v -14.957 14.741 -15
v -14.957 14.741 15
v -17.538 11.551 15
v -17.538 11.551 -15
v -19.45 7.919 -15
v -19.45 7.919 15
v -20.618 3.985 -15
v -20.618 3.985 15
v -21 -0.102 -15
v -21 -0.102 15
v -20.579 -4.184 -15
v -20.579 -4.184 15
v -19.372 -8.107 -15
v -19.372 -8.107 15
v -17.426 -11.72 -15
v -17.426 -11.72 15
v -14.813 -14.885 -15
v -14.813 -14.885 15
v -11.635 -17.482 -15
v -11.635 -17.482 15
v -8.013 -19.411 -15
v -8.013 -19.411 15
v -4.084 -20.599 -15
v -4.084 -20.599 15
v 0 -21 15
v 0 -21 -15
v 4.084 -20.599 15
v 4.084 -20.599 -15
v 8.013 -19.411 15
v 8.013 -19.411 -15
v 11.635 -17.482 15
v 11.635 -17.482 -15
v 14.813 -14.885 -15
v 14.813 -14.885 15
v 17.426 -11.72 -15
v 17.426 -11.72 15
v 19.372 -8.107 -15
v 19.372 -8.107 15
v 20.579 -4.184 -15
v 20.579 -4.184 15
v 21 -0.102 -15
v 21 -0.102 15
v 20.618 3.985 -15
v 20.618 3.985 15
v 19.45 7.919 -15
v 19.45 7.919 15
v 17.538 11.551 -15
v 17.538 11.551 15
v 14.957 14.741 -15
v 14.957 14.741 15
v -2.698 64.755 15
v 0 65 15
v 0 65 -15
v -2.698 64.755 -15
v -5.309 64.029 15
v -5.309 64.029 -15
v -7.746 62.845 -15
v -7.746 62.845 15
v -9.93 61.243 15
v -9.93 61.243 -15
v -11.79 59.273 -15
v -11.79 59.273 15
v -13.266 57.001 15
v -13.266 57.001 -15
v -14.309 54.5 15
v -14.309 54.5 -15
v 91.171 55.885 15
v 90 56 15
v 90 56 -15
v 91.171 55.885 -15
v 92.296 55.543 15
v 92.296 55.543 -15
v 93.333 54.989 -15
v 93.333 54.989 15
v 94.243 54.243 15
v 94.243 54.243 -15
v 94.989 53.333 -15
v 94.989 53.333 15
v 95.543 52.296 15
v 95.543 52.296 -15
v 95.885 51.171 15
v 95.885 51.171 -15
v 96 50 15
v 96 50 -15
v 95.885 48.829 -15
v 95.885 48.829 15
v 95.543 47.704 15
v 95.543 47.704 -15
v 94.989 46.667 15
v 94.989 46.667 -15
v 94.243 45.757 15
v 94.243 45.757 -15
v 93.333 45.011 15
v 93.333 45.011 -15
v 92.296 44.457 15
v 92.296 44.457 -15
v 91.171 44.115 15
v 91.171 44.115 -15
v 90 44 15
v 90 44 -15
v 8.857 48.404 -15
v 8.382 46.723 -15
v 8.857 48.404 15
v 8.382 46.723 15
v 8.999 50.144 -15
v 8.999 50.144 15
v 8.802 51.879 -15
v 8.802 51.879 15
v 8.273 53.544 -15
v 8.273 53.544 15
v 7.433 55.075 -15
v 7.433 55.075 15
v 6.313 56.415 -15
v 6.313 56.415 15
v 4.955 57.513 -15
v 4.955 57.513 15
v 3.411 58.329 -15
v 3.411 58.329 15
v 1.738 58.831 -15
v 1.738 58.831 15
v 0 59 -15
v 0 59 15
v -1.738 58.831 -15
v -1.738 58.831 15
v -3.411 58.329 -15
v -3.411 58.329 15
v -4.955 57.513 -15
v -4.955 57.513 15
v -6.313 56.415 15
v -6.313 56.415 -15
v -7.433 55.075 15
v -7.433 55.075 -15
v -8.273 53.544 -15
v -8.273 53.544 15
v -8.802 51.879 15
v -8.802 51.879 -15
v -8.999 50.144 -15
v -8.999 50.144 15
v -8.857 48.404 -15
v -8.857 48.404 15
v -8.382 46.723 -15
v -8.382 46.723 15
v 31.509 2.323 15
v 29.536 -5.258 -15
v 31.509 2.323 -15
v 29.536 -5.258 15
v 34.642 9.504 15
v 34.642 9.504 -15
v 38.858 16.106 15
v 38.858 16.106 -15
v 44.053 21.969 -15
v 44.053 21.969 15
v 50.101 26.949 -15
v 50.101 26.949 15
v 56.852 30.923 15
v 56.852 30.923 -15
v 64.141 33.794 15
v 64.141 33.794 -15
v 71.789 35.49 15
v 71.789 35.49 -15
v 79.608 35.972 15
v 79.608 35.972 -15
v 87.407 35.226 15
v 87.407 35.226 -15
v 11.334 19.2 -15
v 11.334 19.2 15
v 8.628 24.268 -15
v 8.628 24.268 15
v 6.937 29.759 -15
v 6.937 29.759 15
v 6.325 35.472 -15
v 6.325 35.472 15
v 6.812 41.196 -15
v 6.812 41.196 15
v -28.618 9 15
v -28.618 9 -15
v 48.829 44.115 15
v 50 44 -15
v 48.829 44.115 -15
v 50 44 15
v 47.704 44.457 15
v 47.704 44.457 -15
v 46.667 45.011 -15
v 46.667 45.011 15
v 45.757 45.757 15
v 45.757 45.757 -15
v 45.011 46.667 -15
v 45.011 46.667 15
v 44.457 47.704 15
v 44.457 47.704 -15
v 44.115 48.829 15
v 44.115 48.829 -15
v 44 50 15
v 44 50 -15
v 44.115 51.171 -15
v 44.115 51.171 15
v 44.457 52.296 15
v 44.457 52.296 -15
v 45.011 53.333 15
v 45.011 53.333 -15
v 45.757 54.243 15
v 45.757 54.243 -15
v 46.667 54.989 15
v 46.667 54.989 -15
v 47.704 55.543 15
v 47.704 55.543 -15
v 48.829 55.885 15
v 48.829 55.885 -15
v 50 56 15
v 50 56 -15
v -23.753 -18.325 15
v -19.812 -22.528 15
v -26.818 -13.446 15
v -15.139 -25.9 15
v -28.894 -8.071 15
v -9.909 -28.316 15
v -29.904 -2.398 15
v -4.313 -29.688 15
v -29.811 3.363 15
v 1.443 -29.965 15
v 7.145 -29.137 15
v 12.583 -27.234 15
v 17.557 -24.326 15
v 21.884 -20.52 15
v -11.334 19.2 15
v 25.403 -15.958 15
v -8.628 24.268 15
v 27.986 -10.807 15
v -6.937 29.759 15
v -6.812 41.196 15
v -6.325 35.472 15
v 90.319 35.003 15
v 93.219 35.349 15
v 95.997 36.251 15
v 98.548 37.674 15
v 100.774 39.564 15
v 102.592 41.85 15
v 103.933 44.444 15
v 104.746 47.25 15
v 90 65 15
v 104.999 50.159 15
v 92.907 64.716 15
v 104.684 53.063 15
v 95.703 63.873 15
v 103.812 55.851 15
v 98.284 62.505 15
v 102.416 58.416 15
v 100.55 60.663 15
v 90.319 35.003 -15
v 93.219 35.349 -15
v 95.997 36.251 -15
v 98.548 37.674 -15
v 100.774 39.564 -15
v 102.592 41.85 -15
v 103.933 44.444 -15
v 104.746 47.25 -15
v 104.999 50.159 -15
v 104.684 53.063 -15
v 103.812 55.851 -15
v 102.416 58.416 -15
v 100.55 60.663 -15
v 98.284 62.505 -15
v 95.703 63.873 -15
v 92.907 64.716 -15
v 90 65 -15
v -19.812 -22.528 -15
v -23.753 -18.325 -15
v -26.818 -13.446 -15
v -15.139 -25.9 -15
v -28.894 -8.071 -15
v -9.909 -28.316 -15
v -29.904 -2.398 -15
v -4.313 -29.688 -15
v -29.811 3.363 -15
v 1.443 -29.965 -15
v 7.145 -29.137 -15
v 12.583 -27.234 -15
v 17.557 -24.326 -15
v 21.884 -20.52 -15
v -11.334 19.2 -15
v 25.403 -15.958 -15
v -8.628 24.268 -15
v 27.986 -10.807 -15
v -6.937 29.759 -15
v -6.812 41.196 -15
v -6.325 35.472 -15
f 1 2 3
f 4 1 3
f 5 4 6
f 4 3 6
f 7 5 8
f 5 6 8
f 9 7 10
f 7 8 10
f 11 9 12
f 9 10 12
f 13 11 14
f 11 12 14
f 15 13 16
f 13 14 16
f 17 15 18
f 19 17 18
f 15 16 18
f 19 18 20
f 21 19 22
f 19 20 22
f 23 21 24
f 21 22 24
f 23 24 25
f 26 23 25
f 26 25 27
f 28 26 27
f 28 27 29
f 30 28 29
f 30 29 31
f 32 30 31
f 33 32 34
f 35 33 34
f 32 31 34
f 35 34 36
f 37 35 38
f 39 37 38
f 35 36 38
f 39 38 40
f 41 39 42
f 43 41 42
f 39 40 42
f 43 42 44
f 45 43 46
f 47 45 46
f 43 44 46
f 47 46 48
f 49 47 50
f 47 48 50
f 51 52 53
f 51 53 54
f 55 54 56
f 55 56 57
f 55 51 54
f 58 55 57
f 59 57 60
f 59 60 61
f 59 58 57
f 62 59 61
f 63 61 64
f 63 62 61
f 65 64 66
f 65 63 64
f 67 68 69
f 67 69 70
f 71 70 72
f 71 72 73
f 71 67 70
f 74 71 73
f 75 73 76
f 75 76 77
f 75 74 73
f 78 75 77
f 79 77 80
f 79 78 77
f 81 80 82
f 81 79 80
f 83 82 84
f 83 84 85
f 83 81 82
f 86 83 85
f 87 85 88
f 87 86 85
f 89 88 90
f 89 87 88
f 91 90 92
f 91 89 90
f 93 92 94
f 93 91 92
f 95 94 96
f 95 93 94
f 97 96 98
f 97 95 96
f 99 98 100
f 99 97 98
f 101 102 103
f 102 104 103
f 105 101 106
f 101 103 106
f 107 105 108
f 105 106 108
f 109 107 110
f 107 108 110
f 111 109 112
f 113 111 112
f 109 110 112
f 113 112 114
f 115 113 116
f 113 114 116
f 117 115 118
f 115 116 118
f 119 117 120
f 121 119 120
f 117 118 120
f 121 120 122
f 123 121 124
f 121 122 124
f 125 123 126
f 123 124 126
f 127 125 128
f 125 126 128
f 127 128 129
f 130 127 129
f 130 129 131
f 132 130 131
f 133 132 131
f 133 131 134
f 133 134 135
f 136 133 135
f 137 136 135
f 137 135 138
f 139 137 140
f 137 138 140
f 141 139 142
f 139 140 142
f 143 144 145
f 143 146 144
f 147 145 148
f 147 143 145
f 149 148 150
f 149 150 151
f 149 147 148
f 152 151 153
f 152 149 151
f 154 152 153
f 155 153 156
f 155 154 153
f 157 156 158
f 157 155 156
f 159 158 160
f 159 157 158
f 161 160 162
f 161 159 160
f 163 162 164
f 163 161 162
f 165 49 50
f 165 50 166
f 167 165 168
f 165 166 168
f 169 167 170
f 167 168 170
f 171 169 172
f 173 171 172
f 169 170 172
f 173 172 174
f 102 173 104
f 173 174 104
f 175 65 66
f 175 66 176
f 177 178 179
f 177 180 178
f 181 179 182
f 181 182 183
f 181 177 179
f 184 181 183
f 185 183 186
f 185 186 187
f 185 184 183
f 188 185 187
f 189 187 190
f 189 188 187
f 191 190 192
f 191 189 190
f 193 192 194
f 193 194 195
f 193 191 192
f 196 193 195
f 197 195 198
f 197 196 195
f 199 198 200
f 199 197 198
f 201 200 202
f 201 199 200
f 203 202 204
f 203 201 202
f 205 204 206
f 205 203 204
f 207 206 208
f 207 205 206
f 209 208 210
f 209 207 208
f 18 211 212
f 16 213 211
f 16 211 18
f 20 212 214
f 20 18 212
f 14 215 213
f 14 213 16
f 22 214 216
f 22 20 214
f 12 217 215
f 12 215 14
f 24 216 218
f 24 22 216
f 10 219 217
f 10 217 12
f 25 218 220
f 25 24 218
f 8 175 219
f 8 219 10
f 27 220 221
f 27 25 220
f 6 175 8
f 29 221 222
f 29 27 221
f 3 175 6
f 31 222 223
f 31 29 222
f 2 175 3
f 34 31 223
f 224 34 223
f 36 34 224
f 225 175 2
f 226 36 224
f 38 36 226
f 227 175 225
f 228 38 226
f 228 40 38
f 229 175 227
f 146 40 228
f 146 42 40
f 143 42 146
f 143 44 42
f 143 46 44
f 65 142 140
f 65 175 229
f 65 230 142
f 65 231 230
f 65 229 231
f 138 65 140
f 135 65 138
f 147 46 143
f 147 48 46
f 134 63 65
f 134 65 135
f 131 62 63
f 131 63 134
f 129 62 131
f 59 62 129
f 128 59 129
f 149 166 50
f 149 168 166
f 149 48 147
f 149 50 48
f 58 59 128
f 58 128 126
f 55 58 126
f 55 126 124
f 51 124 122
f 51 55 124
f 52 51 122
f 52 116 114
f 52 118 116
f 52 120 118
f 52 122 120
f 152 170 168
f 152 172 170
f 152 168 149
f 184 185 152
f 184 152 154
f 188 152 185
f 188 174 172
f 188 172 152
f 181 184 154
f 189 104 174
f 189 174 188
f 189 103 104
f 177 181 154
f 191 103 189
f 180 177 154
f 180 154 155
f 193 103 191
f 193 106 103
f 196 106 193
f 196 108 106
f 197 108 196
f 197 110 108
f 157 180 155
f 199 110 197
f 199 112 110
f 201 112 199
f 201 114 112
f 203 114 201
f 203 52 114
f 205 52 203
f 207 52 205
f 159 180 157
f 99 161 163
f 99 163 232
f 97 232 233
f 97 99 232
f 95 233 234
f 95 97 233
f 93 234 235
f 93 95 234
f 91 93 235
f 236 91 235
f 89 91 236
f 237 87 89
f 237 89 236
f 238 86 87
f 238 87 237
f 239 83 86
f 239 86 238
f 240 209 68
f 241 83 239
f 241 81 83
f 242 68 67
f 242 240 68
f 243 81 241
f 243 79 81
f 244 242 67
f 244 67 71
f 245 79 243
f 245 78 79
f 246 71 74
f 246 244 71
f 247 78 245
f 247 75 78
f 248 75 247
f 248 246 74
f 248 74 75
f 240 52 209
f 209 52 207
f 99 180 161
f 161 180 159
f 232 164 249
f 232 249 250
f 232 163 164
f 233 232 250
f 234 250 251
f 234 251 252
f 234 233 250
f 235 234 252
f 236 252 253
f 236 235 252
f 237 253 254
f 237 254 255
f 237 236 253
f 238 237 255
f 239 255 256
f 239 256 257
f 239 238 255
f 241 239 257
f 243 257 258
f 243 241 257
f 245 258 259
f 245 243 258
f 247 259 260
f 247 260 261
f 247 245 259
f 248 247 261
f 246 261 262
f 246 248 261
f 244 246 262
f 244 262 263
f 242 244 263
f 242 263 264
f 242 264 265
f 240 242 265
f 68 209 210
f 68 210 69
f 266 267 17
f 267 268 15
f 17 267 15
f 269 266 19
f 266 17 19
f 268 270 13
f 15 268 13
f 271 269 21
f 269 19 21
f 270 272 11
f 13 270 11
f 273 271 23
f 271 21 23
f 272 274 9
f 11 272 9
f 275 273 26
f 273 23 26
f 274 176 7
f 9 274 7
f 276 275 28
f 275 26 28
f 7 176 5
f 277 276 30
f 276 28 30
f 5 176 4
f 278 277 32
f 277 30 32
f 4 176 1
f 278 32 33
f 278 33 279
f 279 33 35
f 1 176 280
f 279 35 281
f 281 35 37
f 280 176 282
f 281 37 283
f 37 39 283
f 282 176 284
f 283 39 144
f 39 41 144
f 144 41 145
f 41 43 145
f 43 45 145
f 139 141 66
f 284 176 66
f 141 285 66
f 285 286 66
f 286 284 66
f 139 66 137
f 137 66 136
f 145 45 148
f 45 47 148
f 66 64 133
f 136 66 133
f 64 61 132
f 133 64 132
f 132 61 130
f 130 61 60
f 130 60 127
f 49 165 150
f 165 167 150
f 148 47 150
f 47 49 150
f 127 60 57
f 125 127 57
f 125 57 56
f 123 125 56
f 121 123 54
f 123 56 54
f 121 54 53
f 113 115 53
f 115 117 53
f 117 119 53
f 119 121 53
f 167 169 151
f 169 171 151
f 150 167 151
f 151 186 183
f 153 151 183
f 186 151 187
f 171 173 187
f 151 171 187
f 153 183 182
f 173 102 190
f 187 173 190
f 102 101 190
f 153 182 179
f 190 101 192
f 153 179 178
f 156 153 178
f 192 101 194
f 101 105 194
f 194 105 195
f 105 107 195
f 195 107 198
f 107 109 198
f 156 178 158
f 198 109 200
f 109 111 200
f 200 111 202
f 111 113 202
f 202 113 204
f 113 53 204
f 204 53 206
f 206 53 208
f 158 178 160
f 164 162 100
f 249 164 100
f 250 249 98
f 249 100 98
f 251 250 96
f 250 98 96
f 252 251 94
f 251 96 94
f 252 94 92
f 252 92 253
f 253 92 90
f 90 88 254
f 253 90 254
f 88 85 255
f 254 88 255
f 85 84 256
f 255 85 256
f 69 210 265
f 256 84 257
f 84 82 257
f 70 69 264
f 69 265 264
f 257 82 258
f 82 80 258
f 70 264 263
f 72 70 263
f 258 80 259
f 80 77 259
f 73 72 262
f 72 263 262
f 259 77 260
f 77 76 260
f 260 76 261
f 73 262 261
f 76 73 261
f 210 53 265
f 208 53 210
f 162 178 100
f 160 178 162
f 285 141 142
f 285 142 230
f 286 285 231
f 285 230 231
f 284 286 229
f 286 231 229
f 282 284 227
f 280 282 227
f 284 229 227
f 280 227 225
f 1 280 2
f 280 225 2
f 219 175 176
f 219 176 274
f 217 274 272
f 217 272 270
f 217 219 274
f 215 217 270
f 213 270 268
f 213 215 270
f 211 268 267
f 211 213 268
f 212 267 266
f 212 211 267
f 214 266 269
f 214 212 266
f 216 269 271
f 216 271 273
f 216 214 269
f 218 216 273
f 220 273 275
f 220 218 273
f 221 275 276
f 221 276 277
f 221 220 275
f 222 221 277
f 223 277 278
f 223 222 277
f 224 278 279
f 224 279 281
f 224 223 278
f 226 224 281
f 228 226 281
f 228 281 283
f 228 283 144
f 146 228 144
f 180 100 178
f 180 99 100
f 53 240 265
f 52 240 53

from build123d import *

# Parameters (mm, degrees)
BOSS_EXTRUDE1_DEPTH = 15


with BuildPart() as part:
    # Sketch1 → Boss-Extrude1 (new, symmetric)
    with BuildSketch(Plane.XY):
        with BuildLine():
            Line((90, 65), (0, 65))
            ThreePointArc((0, 65), (-8.874119675, 62.093386622), (-14.309088021, 54.5))
            Line((-14.309088021, 54.5), (-28.618176043, 9))
            ThreePointArc((-28.618176043, 9), (-7.143700144, -29.137047693), (29.535645594, -5.25791207))
            ThreePointArc((29.535645594, -5.25791207), (50.100874494, 26.949083525), (87.406551135, 35.225900265))
            ThreePointArc((87.406551135, 35.225900265), (104.943418217, 48.698365648), (90, 65))
        make_face()
        with BuildLine():
            Line((50, 56), (90, 56))
            ThreePointArc((90, 56), (96, 50), (90, 44))
            Line((90, 44), (50, 44))
            ThreePointArc((50, 44), (44, 50), (50, 56))
        make_face(mode=Mode.SUBTRACT)
        with BuildLine():
            ThreePointArc((-14.956527547, 14.741176471), (0, -21), (14.956527547, 14.741176471))
            ThreePointArc((14.956527547, 14.741176471), (6.937432482, 29.759413292), (8.382229724, 46.723076923))
            ThreePointArc((8.382229724, 46.723076923), (0, 59), (-8.382229724, 46.723076923))
            ThreePointArc((-8.382229724, 46.723076923), (-6.937432482, 29.759413292), (-14.956527547, 14.741176471))
        make_face(mode=Mode.SUBTRACT)
    extrude(amount=BOSS_EXTRUDE1_DEPTH, both=True)


solid = part.part
